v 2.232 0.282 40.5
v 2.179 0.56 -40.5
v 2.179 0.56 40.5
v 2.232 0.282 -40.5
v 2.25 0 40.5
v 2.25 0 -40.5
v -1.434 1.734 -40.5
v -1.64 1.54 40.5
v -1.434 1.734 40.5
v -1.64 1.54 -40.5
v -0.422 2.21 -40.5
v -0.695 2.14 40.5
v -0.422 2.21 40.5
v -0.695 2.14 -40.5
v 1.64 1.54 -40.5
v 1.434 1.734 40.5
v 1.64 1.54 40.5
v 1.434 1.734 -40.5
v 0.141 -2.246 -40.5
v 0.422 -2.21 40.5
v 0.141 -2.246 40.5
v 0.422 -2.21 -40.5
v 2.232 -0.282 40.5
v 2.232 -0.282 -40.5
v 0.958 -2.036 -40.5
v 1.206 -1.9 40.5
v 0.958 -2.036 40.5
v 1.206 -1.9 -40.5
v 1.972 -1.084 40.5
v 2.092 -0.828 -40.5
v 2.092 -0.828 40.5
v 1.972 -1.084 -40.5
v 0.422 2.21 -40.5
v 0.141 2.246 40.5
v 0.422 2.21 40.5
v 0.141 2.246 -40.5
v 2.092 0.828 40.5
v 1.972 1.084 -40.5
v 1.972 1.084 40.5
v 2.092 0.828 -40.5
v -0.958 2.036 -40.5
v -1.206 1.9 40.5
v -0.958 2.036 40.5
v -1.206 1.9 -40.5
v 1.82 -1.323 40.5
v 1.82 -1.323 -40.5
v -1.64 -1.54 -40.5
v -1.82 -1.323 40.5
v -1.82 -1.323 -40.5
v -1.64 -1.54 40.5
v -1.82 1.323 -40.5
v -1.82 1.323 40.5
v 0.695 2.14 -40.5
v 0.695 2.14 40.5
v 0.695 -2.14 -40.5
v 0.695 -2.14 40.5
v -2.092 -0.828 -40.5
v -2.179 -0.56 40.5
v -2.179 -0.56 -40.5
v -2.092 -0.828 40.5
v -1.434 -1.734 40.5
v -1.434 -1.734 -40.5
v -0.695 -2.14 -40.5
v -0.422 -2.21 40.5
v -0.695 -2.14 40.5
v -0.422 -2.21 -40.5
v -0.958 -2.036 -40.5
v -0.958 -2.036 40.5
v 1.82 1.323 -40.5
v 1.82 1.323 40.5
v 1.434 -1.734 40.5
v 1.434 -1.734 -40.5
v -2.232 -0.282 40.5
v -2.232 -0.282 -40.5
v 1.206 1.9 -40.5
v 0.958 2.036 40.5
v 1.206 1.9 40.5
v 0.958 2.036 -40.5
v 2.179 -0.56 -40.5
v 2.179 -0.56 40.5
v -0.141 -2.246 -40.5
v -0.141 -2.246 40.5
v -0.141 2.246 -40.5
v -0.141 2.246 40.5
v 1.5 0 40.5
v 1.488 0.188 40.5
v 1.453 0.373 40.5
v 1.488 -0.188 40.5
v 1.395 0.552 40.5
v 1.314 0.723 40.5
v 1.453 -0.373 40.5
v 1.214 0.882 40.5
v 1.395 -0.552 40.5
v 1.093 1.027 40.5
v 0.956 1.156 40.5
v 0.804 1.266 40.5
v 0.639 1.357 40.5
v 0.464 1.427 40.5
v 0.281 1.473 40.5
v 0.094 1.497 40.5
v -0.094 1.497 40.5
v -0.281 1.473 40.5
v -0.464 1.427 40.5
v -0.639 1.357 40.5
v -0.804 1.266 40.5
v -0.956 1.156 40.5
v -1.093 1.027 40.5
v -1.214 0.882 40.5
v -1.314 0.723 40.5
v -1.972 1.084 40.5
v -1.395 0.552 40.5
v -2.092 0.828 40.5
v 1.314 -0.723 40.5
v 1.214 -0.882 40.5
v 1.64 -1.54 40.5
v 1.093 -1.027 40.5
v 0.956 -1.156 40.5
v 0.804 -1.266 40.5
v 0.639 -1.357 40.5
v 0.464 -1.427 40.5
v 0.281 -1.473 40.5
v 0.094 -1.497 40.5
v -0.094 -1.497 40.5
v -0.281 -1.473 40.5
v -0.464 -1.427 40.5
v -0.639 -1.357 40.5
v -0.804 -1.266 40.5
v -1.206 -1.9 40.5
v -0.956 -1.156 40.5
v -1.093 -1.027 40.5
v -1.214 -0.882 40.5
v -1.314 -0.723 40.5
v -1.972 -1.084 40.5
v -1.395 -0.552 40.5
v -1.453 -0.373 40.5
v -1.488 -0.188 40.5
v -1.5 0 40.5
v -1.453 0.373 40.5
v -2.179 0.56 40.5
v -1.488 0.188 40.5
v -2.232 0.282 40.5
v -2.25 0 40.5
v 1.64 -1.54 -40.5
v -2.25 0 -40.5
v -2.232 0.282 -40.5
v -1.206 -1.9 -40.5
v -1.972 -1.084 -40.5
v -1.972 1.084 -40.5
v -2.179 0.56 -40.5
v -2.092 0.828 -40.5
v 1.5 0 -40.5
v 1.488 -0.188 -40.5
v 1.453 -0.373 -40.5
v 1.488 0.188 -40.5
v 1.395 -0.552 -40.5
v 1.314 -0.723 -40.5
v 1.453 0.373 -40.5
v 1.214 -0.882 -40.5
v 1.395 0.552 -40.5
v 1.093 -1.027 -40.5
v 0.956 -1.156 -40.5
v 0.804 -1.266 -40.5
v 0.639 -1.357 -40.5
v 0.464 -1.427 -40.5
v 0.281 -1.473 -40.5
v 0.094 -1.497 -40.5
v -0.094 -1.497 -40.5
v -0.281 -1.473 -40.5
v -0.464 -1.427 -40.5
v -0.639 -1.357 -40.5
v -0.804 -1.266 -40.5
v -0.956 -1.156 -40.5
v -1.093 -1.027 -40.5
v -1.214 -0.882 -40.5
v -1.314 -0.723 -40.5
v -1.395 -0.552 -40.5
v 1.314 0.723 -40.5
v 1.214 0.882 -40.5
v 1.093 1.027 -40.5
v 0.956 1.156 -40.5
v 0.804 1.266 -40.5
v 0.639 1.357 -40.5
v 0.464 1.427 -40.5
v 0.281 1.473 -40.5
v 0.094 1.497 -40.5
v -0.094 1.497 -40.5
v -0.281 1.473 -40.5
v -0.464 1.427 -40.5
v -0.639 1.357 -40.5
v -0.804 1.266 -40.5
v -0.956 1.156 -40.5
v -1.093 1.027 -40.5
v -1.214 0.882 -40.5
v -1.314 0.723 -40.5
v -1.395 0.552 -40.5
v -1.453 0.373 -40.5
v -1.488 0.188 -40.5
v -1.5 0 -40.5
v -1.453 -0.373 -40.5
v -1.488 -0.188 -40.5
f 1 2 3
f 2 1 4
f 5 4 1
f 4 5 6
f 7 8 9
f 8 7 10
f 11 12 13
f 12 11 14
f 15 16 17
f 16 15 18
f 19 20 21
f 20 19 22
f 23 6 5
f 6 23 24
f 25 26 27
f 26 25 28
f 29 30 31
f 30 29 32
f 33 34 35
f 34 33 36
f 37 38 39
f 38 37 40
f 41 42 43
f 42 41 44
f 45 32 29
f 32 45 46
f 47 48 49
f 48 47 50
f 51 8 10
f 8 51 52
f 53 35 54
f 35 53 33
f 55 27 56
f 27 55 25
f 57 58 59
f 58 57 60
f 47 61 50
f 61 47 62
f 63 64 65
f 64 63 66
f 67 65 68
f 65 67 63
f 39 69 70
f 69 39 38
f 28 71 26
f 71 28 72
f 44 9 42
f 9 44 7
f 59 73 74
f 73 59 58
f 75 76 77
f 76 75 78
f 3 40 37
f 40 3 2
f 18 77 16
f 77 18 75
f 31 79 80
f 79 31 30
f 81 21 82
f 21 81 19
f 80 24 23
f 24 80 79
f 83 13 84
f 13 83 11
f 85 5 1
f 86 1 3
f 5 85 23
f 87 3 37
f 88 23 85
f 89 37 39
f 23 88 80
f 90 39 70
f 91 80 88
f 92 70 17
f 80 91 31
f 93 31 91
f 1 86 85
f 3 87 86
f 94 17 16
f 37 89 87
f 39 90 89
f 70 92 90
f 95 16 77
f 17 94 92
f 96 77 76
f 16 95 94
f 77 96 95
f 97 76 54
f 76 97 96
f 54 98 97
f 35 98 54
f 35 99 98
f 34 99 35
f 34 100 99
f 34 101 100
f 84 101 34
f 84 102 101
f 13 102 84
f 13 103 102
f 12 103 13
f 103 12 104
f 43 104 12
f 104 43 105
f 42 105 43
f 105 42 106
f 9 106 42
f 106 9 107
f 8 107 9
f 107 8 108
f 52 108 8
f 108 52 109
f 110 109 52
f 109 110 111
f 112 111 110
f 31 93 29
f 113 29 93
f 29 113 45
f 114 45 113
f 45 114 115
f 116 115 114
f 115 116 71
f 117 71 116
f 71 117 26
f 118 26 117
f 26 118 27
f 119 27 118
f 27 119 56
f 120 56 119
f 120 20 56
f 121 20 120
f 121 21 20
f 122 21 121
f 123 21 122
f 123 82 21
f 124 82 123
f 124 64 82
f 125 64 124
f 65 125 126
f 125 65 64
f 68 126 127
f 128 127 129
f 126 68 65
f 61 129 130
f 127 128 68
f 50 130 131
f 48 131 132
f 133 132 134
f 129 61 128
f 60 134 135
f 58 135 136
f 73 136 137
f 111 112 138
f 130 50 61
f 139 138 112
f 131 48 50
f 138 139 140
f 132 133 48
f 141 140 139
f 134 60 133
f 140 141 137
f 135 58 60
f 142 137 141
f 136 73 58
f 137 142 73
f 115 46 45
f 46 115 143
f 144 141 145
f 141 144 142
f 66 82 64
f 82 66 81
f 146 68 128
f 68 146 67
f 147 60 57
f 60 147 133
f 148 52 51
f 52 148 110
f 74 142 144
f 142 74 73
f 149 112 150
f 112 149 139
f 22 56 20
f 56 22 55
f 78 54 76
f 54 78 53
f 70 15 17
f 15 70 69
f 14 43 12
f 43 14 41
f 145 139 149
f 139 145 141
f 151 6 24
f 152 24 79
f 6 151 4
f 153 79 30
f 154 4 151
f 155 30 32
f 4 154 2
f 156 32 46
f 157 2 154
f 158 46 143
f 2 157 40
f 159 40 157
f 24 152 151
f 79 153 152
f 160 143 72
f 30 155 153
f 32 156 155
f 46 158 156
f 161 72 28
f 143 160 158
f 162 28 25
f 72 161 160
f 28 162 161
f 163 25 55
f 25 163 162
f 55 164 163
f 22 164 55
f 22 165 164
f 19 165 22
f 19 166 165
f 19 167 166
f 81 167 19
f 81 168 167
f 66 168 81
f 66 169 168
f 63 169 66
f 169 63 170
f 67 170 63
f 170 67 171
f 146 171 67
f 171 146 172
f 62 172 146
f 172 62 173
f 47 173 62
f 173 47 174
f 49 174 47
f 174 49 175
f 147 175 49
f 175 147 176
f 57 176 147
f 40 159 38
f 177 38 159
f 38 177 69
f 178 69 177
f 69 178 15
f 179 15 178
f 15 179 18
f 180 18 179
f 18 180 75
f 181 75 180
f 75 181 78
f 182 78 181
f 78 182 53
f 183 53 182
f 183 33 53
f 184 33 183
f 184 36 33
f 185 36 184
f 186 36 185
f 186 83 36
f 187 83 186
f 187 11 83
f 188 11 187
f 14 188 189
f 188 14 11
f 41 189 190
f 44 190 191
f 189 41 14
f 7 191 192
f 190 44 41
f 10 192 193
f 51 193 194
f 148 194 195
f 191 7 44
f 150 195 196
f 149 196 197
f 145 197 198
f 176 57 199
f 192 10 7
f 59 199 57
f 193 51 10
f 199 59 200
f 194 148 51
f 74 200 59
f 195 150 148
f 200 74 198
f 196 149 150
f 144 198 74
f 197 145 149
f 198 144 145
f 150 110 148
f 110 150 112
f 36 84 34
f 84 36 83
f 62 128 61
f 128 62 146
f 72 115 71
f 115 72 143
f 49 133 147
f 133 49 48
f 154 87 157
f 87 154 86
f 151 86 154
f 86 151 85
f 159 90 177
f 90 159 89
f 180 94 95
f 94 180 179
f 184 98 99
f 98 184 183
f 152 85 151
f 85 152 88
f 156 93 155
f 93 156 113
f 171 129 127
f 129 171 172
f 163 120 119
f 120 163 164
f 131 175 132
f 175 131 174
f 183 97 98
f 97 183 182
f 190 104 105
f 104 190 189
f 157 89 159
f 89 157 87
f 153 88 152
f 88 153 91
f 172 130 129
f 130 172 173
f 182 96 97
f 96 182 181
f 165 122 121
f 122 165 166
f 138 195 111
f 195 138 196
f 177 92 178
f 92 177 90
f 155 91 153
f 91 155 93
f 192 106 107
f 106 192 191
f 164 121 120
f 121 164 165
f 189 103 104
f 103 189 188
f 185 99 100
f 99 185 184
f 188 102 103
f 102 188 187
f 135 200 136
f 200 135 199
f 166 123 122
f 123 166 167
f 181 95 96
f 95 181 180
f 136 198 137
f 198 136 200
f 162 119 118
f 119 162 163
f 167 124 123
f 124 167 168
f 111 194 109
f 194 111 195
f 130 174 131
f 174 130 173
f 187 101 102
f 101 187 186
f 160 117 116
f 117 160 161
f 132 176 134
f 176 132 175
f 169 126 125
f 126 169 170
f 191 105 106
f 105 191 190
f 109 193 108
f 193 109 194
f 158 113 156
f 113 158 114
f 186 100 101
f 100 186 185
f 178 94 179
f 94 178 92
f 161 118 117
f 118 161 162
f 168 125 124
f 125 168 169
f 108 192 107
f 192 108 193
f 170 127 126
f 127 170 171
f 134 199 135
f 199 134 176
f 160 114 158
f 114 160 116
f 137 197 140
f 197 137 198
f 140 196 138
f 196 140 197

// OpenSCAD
$fn = 50;


difference() {
	union() {
		translate(v = [0, 0, -40.5000000000]) {
			cylinder(h = 81, r = 2.2500000000);
		}
	}
	union() {
		translate(v = [0, 0, -100.0000000000]) {
			cylinder(h = 200, r = 1.5000000000);
		}
	}
}
